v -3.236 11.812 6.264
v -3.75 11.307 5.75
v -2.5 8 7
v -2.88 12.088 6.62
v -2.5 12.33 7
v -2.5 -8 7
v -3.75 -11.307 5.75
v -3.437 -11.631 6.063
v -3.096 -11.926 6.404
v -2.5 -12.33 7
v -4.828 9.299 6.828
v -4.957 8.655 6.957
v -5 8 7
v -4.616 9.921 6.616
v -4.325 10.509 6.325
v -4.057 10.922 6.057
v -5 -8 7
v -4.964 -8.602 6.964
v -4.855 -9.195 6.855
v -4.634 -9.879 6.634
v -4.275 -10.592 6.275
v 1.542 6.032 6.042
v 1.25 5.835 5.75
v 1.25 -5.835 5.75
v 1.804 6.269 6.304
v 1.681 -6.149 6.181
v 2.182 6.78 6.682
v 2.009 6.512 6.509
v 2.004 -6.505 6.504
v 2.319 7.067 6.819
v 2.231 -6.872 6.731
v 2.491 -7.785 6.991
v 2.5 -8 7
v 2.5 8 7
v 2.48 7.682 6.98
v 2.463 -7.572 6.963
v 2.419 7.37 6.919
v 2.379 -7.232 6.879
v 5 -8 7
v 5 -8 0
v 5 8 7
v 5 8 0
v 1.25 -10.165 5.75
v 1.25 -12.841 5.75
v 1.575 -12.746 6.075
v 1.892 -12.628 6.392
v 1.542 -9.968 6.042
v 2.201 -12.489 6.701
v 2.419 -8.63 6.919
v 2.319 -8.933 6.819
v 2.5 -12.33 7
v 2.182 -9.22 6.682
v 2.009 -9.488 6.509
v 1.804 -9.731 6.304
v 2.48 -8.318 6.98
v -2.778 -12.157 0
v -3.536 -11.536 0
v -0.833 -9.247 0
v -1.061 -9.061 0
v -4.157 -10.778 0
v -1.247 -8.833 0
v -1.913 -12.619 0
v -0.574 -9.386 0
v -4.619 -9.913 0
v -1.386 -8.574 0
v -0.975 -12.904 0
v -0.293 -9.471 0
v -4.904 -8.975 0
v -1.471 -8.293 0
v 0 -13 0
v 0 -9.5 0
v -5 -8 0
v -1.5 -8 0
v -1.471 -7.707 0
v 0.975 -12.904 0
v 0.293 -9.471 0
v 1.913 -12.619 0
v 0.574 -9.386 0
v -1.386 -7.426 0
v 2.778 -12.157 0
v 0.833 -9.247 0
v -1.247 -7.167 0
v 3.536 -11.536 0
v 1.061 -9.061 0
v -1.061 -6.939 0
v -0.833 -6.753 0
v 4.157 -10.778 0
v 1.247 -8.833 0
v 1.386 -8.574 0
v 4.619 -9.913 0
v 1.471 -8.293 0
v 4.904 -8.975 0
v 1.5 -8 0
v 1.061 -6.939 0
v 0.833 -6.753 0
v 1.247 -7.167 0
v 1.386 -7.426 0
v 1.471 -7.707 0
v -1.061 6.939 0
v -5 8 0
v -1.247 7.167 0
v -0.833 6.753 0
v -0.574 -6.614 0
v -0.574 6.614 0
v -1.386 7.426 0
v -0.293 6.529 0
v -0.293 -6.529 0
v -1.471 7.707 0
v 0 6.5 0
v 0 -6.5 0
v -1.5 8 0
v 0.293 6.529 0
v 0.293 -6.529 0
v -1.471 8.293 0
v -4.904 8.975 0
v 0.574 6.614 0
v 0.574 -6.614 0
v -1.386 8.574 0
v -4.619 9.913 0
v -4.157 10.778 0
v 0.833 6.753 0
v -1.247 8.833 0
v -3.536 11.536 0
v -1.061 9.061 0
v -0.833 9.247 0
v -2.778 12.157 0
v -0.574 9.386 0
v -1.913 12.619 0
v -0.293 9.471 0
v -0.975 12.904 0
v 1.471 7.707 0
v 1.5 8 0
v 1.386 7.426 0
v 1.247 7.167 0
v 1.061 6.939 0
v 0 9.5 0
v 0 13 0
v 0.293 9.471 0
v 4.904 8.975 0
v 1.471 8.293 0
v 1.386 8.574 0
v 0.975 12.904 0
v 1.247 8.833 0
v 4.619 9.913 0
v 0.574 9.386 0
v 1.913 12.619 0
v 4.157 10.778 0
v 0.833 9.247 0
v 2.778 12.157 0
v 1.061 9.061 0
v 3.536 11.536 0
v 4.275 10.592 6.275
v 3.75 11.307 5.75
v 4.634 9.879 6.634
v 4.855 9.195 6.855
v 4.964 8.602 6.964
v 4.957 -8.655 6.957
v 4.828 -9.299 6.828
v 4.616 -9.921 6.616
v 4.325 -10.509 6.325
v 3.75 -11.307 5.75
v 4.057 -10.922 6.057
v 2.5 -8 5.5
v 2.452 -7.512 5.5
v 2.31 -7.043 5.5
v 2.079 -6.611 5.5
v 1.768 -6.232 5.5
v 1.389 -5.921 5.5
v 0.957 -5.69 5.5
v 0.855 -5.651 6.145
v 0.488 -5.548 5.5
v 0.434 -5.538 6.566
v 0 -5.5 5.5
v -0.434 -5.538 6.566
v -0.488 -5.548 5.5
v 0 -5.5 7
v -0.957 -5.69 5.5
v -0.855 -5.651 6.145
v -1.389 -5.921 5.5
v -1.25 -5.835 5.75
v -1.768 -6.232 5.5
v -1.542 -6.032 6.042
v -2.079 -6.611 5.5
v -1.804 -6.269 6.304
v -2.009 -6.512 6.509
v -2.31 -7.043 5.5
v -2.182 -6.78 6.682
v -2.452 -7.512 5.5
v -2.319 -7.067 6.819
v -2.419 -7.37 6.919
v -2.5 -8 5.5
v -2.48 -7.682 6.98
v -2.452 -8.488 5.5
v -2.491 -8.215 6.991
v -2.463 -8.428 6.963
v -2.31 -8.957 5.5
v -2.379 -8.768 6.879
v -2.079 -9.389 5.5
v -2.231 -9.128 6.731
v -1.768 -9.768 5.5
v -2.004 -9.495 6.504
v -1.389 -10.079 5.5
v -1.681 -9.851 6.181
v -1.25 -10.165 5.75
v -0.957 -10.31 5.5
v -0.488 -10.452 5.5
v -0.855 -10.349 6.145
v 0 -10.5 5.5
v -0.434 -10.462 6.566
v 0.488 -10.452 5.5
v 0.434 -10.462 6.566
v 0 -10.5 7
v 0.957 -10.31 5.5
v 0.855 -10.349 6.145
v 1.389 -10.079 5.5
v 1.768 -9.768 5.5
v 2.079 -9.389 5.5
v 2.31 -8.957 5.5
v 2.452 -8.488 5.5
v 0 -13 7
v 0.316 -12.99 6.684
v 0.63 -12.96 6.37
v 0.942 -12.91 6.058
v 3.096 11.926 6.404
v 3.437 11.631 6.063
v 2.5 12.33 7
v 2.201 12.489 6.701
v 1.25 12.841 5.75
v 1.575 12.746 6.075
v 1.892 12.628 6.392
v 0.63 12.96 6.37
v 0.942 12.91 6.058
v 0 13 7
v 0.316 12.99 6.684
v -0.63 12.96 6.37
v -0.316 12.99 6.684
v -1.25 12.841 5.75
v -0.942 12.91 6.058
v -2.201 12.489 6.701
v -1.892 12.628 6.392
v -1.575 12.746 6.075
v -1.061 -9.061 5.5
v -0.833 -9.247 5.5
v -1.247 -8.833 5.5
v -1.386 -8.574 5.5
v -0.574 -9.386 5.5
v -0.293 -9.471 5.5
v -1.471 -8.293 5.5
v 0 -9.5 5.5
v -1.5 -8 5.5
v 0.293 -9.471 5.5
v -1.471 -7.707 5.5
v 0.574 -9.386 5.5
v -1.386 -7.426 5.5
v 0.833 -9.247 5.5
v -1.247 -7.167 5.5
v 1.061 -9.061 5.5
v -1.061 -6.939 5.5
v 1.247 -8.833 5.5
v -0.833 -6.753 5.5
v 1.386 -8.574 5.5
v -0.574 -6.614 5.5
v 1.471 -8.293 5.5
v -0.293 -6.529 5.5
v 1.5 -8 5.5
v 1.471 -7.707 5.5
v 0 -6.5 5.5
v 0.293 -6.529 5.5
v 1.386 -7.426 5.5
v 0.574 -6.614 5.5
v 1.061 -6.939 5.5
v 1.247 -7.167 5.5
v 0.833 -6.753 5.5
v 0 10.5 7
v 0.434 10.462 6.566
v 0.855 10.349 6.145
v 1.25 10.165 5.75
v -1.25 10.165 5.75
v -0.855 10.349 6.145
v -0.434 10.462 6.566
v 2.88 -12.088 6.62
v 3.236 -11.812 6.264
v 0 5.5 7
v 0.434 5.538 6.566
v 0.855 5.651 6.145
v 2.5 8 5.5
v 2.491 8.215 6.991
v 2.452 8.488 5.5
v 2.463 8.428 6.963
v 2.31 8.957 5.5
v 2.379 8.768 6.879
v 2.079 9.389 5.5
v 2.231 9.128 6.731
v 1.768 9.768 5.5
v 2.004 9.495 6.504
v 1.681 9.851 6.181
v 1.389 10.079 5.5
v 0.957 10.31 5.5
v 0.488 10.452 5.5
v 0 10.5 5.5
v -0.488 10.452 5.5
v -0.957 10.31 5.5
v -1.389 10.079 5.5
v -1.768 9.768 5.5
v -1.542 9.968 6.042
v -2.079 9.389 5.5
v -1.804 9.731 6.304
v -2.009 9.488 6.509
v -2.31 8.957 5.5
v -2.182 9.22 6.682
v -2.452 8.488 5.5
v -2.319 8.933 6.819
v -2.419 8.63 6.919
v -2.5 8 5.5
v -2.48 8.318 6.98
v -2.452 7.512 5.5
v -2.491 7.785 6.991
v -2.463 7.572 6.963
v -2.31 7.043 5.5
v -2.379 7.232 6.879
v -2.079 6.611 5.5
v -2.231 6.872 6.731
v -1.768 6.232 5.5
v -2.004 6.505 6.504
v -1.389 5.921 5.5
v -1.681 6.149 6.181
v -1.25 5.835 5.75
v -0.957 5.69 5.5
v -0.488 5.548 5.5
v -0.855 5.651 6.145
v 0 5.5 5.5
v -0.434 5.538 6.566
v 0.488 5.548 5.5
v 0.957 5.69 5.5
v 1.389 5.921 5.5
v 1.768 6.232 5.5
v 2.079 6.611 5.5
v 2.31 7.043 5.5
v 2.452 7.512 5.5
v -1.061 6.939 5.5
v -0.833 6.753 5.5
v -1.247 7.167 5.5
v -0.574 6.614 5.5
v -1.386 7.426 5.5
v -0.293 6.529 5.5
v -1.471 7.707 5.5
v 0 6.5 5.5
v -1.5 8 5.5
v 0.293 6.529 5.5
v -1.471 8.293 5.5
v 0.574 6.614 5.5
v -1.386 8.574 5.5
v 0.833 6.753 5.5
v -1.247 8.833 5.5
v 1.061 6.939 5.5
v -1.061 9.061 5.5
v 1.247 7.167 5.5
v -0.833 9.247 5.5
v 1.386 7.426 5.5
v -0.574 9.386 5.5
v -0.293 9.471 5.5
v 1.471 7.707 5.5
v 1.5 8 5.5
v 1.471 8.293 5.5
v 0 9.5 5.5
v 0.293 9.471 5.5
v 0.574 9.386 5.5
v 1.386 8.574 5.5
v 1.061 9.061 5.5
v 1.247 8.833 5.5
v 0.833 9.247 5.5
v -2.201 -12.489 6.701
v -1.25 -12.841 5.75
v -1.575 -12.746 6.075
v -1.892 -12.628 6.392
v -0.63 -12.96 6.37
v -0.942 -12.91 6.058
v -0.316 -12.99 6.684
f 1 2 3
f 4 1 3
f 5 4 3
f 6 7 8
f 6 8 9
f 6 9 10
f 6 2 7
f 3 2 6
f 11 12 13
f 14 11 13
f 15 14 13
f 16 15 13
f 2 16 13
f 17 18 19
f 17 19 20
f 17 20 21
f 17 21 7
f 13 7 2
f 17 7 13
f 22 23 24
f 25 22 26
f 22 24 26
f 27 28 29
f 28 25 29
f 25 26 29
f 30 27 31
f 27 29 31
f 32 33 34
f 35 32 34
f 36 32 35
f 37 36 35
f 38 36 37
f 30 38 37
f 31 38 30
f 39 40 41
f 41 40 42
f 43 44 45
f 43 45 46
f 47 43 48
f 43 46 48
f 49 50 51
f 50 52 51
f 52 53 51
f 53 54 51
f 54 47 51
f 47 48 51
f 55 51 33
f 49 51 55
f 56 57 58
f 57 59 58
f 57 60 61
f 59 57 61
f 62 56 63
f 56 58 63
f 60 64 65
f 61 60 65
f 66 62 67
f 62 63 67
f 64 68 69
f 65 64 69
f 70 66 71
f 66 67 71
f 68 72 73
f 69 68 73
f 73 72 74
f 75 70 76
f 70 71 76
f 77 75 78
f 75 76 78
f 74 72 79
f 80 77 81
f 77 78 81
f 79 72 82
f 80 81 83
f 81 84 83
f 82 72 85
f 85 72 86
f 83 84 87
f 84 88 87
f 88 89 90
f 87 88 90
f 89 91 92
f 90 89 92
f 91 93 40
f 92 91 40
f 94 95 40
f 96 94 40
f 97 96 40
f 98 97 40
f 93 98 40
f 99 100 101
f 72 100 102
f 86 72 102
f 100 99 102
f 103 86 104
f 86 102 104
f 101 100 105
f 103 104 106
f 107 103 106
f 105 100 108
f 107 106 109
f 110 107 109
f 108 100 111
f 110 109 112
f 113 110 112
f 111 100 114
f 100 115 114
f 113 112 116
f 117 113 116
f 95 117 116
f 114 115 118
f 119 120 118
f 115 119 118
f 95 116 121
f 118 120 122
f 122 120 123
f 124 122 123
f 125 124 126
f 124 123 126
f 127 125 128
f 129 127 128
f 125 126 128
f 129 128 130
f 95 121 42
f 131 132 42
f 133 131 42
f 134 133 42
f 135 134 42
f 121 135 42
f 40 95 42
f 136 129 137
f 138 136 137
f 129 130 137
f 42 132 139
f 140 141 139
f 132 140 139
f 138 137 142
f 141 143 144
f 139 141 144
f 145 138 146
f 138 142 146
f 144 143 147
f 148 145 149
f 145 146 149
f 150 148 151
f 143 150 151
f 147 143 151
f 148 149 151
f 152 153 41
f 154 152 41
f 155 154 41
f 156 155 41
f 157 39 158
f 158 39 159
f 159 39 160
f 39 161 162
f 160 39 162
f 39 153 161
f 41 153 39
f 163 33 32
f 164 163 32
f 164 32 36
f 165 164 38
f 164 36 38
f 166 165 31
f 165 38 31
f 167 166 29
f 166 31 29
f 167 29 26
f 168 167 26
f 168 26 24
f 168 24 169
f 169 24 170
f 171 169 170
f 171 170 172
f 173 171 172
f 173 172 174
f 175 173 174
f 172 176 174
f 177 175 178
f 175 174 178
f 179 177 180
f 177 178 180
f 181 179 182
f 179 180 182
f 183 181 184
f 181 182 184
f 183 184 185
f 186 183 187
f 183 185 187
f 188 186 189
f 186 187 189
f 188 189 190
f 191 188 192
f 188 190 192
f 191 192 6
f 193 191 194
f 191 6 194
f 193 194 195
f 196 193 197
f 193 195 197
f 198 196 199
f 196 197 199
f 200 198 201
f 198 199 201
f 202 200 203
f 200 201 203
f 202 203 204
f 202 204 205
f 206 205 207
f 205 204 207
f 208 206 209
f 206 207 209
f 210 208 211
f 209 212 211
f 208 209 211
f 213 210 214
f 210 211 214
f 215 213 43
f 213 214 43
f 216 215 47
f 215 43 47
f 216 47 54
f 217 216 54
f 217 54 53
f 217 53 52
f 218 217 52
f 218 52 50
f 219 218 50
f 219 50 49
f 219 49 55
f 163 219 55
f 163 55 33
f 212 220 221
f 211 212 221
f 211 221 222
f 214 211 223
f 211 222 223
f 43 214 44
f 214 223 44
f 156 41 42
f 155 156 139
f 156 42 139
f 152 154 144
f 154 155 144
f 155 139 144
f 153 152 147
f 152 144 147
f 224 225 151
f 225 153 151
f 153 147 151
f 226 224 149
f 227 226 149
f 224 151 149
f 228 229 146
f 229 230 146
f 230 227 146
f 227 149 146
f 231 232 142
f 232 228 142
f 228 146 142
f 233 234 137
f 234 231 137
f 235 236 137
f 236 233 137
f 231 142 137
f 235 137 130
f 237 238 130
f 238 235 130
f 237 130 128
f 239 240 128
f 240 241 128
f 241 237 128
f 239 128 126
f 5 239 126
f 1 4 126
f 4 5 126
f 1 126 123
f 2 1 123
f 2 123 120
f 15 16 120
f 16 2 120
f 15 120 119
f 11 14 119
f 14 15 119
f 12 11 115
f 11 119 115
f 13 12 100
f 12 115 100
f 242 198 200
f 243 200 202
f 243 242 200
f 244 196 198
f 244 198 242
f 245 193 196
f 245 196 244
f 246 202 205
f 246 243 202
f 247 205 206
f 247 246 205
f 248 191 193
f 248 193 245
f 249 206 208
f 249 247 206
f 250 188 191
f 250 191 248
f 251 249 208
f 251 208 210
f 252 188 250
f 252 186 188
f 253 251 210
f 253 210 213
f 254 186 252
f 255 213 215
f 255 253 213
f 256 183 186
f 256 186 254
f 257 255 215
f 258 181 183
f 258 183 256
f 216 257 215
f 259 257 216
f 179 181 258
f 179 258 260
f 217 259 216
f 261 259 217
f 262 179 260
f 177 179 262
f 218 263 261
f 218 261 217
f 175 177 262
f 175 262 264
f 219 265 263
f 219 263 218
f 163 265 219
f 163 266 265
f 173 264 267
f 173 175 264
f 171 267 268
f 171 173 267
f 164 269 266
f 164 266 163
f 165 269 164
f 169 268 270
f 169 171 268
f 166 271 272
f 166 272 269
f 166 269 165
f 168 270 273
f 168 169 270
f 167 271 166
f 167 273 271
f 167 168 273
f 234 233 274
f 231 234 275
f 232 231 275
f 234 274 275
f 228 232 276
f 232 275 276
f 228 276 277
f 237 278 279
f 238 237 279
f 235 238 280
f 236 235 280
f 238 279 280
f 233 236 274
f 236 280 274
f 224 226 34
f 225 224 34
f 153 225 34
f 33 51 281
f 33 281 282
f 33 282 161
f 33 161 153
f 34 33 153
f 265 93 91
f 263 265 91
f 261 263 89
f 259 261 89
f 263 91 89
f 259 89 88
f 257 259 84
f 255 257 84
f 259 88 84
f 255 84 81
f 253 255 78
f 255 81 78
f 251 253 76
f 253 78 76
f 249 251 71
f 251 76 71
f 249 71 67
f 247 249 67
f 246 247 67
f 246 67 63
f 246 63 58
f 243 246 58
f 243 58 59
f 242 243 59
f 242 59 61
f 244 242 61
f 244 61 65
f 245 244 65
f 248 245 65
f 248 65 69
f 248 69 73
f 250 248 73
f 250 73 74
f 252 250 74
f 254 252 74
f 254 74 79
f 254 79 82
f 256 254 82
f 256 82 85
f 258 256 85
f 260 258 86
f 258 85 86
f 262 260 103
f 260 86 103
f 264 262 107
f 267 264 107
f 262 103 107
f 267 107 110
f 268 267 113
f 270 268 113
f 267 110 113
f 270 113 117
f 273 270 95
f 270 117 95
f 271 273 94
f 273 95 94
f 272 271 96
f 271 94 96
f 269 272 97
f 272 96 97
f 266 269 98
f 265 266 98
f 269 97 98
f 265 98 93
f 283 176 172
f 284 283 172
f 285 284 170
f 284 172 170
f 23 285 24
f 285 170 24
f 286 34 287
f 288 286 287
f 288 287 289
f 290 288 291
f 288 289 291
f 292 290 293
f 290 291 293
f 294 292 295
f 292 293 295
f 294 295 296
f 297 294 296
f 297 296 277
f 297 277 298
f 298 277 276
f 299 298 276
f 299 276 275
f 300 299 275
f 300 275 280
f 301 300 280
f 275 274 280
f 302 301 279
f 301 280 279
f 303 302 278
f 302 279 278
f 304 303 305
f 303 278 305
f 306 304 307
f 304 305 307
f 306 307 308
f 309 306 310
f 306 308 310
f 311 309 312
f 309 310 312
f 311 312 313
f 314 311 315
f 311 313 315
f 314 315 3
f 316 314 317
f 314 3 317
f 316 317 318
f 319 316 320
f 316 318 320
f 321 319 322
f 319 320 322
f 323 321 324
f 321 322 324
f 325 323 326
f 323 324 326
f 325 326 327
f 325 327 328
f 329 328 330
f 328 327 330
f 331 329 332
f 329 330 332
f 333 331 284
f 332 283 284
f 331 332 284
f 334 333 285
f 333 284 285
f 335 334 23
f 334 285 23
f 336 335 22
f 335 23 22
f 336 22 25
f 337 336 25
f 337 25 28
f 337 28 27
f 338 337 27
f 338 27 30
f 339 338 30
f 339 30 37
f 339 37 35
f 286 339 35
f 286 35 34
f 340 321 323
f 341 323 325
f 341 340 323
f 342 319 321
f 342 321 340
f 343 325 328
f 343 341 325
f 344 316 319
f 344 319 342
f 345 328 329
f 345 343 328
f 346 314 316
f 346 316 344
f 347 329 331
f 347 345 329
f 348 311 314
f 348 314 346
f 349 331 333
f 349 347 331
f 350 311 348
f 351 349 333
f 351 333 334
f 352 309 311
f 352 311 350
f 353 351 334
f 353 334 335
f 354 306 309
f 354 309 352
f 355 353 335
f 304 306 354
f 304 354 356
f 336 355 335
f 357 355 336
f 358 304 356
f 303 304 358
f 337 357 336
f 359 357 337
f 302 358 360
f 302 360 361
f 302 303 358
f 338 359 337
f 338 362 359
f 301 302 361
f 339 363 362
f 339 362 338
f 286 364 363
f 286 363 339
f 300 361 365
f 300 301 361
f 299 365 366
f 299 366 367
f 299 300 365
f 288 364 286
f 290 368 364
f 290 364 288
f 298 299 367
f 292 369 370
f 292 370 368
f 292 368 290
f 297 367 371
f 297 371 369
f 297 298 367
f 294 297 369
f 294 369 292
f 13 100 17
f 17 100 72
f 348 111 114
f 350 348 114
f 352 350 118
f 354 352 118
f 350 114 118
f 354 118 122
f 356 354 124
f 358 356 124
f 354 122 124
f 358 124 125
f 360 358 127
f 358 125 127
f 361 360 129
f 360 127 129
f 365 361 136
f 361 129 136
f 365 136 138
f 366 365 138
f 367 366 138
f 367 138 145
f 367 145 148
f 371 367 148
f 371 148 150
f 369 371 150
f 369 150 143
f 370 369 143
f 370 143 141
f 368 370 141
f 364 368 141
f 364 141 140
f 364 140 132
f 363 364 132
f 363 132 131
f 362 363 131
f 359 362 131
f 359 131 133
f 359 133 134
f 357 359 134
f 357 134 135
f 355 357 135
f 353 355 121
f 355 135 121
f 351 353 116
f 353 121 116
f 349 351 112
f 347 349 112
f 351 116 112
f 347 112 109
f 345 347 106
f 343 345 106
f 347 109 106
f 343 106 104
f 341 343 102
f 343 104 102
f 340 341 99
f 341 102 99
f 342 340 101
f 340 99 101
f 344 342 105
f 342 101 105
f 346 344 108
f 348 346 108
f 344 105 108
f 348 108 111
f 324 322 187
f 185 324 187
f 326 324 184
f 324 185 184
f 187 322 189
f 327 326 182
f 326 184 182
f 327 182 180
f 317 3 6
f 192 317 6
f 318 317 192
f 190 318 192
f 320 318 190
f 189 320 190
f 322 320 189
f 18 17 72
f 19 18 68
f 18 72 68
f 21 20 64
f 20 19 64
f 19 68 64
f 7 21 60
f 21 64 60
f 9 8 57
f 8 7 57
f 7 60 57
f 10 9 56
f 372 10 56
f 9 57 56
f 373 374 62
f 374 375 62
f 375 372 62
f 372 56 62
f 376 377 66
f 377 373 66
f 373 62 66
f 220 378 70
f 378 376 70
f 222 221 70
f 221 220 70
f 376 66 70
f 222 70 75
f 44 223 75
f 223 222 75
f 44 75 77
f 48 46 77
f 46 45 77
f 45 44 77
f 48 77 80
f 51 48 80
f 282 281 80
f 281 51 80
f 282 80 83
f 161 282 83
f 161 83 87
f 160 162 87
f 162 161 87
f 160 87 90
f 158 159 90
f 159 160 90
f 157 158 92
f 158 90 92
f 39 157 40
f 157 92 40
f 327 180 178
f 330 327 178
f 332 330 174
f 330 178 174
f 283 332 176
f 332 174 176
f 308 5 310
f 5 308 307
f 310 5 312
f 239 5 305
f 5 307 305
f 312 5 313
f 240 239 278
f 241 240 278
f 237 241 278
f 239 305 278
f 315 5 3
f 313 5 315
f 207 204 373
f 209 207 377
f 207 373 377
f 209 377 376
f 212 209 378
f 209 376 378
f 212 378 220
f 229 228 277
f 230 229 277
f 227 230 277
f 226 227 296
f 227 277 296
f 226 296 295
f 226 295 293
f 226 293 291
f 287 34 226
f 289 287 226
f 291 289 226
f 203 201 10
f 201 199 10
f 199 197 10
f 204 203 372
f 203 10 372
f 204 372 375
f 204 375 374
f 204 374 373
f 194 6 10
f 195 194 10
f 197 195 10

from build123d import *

# Parameters (mm, degrees)
F1_DEPTH = 7
F3_DEPTH = 50
F4_DEPTH = 100
F6_R     = 2.5
F7_DEPTH = 1.5


with BuildPart() as f1:
    # F0 (on Top) → F1 (new body)
    with BuildSketch(Plane.XY):
        with BuildLine():
            Line((5, 8), (1.5, 8))
            ThreePointArc((1.5, 8), (0, 6.5), (-1.5, 8))
            Line((-1.5, 8), (-5, 8))
            Line((-5, 8), (-5, -8))
            Line((-5, -8), (-1.5, -8))
            ThreePointArc((-1.5, -8), (0, -6.5), (1.5, -8))
            Line((1.5, -8), (5, -8))
            Line((5, -8), (5, 8))
        make_face()
        with BuildLine():
            ThreePointArc((-1.5, 8), (0, 9.5), (1.5, 8))
            Line((1.5, 8), (5, 8))
            ThreePointArc((5, 8), (0, 13), (-5, 8))
            Line((-5, 8), (-1.5, 8))
        make_face()
        with BuildLine():
            ThreePointArc((-5, -8), (0, -13), (5, -8))
            Line((5, -8), (1.5, -8))
            ThreePointArc((1.5, -8), (0, -9.5), (-1.5, -8))
            Line((-1.5, -8), (-5, -8))
        make_face()
    extrude(amount=F1_DEPTH)


with BuildPart() as f3:
    # F2 (on Front) → F3 (new body)
    with BuildSketch(Plane.XZ):
        Polygon((-3.75, 5.75), (-2.5, 7), (-5, 7), align=None)
    extrude(amount=F3_DEPTH)


with BuildPart() as f3b:
    # F2 (on Front) → F3, piece 2 (new body)
    with BuildSketch(Plane.XZ):
        Polygon((-1.25, 5.75), (0, 7), (-2.5, 7), align=None)
    extrude(amount=F3_DEPTH)


with BuildPart() as f3c:
    # F2 (on Front) → F3, piece 3 (new body)
    with BuildSketch(Plane.XZ):
        Polygon((2.5, 7), (0, 7), (1.25, 5.75), align=None)
    extrude(amount=F3_DEPTH)


with BuildPart() as f3d:
    # F2 (on Front) → F3, piece 4 (new body)
    with BuildSketch(Plane.XZ):
        Polygon((5, 7), (2.5, 7), (3.75, 5.75), align=None)
    extrude(amount=F3_DEPTH)


with BuildPart() as f4_tool:
    # F3_face (on face) → F4 (new body)
    with BuildSketch(Plane(origin=(-3.75, -50, 6.5833333333), x_dir=(1, 0, 0), z_dir=(0, -1, 0))):
        Polygon((0, -0.8333333333), (1.25, 0.4166666667), (-1.25, 0.4166666667), align=None)
        Polygon((2.5, -0.8333333333), (3.75, 0.4166666667), (1.25, 0.4166666667), align=None)
        Polygon((6.25, 0.4166666667), (3.75, 0.4166666667), (5, -0.8333333333), align=None)
        Polygon((8.75, 0.4166666667), (6.25, 0.4166666667), (7.5, -0.8333333333), align=None)
    extrude(amount=-F4_DEPTH)


with BuildPart() as f1_1:
    add(f1.part)

    # F4: cut by f4_tool
    add(f4_tool.part, mode=Mode.SUBTRACT)

    # F6 (on offset) → F7 (cut)
    with BuildSketch(Plane.XY.offset(7)):
        with Locations((0, -8)):
            Circle(F6_R)
        with Locations((0, 8)):
            Circle(F6_R)
    extrude(amount=-F7_DEPTH, mode=Mode.SUBTRACT)


with BuildPart() as f3_1:
    add(f3.part)

    # F4: cut by f4_tool
    add(f4_tool.part, mode=Mode.SUBTRACT)


with BuildPart() as f3b_1:
    add(f3b.part)

    # F4: cut by f4_tool
    add(f4_tool.part, mode=Mode.SUBTRACT)


with BuildPart() as f3c_1:
    add(f3c.part)

    # F4: cut by f4_tool
    add(f4_tool.part, mode=Mode.SUBTRACT)


with BuildPart() as f3d_1:
    add(f3d.part)

    # F4: cut by f4_tool
    add(f4_tool.part, mode=Mode.SUBTRACT)


solid = f1_1.part
